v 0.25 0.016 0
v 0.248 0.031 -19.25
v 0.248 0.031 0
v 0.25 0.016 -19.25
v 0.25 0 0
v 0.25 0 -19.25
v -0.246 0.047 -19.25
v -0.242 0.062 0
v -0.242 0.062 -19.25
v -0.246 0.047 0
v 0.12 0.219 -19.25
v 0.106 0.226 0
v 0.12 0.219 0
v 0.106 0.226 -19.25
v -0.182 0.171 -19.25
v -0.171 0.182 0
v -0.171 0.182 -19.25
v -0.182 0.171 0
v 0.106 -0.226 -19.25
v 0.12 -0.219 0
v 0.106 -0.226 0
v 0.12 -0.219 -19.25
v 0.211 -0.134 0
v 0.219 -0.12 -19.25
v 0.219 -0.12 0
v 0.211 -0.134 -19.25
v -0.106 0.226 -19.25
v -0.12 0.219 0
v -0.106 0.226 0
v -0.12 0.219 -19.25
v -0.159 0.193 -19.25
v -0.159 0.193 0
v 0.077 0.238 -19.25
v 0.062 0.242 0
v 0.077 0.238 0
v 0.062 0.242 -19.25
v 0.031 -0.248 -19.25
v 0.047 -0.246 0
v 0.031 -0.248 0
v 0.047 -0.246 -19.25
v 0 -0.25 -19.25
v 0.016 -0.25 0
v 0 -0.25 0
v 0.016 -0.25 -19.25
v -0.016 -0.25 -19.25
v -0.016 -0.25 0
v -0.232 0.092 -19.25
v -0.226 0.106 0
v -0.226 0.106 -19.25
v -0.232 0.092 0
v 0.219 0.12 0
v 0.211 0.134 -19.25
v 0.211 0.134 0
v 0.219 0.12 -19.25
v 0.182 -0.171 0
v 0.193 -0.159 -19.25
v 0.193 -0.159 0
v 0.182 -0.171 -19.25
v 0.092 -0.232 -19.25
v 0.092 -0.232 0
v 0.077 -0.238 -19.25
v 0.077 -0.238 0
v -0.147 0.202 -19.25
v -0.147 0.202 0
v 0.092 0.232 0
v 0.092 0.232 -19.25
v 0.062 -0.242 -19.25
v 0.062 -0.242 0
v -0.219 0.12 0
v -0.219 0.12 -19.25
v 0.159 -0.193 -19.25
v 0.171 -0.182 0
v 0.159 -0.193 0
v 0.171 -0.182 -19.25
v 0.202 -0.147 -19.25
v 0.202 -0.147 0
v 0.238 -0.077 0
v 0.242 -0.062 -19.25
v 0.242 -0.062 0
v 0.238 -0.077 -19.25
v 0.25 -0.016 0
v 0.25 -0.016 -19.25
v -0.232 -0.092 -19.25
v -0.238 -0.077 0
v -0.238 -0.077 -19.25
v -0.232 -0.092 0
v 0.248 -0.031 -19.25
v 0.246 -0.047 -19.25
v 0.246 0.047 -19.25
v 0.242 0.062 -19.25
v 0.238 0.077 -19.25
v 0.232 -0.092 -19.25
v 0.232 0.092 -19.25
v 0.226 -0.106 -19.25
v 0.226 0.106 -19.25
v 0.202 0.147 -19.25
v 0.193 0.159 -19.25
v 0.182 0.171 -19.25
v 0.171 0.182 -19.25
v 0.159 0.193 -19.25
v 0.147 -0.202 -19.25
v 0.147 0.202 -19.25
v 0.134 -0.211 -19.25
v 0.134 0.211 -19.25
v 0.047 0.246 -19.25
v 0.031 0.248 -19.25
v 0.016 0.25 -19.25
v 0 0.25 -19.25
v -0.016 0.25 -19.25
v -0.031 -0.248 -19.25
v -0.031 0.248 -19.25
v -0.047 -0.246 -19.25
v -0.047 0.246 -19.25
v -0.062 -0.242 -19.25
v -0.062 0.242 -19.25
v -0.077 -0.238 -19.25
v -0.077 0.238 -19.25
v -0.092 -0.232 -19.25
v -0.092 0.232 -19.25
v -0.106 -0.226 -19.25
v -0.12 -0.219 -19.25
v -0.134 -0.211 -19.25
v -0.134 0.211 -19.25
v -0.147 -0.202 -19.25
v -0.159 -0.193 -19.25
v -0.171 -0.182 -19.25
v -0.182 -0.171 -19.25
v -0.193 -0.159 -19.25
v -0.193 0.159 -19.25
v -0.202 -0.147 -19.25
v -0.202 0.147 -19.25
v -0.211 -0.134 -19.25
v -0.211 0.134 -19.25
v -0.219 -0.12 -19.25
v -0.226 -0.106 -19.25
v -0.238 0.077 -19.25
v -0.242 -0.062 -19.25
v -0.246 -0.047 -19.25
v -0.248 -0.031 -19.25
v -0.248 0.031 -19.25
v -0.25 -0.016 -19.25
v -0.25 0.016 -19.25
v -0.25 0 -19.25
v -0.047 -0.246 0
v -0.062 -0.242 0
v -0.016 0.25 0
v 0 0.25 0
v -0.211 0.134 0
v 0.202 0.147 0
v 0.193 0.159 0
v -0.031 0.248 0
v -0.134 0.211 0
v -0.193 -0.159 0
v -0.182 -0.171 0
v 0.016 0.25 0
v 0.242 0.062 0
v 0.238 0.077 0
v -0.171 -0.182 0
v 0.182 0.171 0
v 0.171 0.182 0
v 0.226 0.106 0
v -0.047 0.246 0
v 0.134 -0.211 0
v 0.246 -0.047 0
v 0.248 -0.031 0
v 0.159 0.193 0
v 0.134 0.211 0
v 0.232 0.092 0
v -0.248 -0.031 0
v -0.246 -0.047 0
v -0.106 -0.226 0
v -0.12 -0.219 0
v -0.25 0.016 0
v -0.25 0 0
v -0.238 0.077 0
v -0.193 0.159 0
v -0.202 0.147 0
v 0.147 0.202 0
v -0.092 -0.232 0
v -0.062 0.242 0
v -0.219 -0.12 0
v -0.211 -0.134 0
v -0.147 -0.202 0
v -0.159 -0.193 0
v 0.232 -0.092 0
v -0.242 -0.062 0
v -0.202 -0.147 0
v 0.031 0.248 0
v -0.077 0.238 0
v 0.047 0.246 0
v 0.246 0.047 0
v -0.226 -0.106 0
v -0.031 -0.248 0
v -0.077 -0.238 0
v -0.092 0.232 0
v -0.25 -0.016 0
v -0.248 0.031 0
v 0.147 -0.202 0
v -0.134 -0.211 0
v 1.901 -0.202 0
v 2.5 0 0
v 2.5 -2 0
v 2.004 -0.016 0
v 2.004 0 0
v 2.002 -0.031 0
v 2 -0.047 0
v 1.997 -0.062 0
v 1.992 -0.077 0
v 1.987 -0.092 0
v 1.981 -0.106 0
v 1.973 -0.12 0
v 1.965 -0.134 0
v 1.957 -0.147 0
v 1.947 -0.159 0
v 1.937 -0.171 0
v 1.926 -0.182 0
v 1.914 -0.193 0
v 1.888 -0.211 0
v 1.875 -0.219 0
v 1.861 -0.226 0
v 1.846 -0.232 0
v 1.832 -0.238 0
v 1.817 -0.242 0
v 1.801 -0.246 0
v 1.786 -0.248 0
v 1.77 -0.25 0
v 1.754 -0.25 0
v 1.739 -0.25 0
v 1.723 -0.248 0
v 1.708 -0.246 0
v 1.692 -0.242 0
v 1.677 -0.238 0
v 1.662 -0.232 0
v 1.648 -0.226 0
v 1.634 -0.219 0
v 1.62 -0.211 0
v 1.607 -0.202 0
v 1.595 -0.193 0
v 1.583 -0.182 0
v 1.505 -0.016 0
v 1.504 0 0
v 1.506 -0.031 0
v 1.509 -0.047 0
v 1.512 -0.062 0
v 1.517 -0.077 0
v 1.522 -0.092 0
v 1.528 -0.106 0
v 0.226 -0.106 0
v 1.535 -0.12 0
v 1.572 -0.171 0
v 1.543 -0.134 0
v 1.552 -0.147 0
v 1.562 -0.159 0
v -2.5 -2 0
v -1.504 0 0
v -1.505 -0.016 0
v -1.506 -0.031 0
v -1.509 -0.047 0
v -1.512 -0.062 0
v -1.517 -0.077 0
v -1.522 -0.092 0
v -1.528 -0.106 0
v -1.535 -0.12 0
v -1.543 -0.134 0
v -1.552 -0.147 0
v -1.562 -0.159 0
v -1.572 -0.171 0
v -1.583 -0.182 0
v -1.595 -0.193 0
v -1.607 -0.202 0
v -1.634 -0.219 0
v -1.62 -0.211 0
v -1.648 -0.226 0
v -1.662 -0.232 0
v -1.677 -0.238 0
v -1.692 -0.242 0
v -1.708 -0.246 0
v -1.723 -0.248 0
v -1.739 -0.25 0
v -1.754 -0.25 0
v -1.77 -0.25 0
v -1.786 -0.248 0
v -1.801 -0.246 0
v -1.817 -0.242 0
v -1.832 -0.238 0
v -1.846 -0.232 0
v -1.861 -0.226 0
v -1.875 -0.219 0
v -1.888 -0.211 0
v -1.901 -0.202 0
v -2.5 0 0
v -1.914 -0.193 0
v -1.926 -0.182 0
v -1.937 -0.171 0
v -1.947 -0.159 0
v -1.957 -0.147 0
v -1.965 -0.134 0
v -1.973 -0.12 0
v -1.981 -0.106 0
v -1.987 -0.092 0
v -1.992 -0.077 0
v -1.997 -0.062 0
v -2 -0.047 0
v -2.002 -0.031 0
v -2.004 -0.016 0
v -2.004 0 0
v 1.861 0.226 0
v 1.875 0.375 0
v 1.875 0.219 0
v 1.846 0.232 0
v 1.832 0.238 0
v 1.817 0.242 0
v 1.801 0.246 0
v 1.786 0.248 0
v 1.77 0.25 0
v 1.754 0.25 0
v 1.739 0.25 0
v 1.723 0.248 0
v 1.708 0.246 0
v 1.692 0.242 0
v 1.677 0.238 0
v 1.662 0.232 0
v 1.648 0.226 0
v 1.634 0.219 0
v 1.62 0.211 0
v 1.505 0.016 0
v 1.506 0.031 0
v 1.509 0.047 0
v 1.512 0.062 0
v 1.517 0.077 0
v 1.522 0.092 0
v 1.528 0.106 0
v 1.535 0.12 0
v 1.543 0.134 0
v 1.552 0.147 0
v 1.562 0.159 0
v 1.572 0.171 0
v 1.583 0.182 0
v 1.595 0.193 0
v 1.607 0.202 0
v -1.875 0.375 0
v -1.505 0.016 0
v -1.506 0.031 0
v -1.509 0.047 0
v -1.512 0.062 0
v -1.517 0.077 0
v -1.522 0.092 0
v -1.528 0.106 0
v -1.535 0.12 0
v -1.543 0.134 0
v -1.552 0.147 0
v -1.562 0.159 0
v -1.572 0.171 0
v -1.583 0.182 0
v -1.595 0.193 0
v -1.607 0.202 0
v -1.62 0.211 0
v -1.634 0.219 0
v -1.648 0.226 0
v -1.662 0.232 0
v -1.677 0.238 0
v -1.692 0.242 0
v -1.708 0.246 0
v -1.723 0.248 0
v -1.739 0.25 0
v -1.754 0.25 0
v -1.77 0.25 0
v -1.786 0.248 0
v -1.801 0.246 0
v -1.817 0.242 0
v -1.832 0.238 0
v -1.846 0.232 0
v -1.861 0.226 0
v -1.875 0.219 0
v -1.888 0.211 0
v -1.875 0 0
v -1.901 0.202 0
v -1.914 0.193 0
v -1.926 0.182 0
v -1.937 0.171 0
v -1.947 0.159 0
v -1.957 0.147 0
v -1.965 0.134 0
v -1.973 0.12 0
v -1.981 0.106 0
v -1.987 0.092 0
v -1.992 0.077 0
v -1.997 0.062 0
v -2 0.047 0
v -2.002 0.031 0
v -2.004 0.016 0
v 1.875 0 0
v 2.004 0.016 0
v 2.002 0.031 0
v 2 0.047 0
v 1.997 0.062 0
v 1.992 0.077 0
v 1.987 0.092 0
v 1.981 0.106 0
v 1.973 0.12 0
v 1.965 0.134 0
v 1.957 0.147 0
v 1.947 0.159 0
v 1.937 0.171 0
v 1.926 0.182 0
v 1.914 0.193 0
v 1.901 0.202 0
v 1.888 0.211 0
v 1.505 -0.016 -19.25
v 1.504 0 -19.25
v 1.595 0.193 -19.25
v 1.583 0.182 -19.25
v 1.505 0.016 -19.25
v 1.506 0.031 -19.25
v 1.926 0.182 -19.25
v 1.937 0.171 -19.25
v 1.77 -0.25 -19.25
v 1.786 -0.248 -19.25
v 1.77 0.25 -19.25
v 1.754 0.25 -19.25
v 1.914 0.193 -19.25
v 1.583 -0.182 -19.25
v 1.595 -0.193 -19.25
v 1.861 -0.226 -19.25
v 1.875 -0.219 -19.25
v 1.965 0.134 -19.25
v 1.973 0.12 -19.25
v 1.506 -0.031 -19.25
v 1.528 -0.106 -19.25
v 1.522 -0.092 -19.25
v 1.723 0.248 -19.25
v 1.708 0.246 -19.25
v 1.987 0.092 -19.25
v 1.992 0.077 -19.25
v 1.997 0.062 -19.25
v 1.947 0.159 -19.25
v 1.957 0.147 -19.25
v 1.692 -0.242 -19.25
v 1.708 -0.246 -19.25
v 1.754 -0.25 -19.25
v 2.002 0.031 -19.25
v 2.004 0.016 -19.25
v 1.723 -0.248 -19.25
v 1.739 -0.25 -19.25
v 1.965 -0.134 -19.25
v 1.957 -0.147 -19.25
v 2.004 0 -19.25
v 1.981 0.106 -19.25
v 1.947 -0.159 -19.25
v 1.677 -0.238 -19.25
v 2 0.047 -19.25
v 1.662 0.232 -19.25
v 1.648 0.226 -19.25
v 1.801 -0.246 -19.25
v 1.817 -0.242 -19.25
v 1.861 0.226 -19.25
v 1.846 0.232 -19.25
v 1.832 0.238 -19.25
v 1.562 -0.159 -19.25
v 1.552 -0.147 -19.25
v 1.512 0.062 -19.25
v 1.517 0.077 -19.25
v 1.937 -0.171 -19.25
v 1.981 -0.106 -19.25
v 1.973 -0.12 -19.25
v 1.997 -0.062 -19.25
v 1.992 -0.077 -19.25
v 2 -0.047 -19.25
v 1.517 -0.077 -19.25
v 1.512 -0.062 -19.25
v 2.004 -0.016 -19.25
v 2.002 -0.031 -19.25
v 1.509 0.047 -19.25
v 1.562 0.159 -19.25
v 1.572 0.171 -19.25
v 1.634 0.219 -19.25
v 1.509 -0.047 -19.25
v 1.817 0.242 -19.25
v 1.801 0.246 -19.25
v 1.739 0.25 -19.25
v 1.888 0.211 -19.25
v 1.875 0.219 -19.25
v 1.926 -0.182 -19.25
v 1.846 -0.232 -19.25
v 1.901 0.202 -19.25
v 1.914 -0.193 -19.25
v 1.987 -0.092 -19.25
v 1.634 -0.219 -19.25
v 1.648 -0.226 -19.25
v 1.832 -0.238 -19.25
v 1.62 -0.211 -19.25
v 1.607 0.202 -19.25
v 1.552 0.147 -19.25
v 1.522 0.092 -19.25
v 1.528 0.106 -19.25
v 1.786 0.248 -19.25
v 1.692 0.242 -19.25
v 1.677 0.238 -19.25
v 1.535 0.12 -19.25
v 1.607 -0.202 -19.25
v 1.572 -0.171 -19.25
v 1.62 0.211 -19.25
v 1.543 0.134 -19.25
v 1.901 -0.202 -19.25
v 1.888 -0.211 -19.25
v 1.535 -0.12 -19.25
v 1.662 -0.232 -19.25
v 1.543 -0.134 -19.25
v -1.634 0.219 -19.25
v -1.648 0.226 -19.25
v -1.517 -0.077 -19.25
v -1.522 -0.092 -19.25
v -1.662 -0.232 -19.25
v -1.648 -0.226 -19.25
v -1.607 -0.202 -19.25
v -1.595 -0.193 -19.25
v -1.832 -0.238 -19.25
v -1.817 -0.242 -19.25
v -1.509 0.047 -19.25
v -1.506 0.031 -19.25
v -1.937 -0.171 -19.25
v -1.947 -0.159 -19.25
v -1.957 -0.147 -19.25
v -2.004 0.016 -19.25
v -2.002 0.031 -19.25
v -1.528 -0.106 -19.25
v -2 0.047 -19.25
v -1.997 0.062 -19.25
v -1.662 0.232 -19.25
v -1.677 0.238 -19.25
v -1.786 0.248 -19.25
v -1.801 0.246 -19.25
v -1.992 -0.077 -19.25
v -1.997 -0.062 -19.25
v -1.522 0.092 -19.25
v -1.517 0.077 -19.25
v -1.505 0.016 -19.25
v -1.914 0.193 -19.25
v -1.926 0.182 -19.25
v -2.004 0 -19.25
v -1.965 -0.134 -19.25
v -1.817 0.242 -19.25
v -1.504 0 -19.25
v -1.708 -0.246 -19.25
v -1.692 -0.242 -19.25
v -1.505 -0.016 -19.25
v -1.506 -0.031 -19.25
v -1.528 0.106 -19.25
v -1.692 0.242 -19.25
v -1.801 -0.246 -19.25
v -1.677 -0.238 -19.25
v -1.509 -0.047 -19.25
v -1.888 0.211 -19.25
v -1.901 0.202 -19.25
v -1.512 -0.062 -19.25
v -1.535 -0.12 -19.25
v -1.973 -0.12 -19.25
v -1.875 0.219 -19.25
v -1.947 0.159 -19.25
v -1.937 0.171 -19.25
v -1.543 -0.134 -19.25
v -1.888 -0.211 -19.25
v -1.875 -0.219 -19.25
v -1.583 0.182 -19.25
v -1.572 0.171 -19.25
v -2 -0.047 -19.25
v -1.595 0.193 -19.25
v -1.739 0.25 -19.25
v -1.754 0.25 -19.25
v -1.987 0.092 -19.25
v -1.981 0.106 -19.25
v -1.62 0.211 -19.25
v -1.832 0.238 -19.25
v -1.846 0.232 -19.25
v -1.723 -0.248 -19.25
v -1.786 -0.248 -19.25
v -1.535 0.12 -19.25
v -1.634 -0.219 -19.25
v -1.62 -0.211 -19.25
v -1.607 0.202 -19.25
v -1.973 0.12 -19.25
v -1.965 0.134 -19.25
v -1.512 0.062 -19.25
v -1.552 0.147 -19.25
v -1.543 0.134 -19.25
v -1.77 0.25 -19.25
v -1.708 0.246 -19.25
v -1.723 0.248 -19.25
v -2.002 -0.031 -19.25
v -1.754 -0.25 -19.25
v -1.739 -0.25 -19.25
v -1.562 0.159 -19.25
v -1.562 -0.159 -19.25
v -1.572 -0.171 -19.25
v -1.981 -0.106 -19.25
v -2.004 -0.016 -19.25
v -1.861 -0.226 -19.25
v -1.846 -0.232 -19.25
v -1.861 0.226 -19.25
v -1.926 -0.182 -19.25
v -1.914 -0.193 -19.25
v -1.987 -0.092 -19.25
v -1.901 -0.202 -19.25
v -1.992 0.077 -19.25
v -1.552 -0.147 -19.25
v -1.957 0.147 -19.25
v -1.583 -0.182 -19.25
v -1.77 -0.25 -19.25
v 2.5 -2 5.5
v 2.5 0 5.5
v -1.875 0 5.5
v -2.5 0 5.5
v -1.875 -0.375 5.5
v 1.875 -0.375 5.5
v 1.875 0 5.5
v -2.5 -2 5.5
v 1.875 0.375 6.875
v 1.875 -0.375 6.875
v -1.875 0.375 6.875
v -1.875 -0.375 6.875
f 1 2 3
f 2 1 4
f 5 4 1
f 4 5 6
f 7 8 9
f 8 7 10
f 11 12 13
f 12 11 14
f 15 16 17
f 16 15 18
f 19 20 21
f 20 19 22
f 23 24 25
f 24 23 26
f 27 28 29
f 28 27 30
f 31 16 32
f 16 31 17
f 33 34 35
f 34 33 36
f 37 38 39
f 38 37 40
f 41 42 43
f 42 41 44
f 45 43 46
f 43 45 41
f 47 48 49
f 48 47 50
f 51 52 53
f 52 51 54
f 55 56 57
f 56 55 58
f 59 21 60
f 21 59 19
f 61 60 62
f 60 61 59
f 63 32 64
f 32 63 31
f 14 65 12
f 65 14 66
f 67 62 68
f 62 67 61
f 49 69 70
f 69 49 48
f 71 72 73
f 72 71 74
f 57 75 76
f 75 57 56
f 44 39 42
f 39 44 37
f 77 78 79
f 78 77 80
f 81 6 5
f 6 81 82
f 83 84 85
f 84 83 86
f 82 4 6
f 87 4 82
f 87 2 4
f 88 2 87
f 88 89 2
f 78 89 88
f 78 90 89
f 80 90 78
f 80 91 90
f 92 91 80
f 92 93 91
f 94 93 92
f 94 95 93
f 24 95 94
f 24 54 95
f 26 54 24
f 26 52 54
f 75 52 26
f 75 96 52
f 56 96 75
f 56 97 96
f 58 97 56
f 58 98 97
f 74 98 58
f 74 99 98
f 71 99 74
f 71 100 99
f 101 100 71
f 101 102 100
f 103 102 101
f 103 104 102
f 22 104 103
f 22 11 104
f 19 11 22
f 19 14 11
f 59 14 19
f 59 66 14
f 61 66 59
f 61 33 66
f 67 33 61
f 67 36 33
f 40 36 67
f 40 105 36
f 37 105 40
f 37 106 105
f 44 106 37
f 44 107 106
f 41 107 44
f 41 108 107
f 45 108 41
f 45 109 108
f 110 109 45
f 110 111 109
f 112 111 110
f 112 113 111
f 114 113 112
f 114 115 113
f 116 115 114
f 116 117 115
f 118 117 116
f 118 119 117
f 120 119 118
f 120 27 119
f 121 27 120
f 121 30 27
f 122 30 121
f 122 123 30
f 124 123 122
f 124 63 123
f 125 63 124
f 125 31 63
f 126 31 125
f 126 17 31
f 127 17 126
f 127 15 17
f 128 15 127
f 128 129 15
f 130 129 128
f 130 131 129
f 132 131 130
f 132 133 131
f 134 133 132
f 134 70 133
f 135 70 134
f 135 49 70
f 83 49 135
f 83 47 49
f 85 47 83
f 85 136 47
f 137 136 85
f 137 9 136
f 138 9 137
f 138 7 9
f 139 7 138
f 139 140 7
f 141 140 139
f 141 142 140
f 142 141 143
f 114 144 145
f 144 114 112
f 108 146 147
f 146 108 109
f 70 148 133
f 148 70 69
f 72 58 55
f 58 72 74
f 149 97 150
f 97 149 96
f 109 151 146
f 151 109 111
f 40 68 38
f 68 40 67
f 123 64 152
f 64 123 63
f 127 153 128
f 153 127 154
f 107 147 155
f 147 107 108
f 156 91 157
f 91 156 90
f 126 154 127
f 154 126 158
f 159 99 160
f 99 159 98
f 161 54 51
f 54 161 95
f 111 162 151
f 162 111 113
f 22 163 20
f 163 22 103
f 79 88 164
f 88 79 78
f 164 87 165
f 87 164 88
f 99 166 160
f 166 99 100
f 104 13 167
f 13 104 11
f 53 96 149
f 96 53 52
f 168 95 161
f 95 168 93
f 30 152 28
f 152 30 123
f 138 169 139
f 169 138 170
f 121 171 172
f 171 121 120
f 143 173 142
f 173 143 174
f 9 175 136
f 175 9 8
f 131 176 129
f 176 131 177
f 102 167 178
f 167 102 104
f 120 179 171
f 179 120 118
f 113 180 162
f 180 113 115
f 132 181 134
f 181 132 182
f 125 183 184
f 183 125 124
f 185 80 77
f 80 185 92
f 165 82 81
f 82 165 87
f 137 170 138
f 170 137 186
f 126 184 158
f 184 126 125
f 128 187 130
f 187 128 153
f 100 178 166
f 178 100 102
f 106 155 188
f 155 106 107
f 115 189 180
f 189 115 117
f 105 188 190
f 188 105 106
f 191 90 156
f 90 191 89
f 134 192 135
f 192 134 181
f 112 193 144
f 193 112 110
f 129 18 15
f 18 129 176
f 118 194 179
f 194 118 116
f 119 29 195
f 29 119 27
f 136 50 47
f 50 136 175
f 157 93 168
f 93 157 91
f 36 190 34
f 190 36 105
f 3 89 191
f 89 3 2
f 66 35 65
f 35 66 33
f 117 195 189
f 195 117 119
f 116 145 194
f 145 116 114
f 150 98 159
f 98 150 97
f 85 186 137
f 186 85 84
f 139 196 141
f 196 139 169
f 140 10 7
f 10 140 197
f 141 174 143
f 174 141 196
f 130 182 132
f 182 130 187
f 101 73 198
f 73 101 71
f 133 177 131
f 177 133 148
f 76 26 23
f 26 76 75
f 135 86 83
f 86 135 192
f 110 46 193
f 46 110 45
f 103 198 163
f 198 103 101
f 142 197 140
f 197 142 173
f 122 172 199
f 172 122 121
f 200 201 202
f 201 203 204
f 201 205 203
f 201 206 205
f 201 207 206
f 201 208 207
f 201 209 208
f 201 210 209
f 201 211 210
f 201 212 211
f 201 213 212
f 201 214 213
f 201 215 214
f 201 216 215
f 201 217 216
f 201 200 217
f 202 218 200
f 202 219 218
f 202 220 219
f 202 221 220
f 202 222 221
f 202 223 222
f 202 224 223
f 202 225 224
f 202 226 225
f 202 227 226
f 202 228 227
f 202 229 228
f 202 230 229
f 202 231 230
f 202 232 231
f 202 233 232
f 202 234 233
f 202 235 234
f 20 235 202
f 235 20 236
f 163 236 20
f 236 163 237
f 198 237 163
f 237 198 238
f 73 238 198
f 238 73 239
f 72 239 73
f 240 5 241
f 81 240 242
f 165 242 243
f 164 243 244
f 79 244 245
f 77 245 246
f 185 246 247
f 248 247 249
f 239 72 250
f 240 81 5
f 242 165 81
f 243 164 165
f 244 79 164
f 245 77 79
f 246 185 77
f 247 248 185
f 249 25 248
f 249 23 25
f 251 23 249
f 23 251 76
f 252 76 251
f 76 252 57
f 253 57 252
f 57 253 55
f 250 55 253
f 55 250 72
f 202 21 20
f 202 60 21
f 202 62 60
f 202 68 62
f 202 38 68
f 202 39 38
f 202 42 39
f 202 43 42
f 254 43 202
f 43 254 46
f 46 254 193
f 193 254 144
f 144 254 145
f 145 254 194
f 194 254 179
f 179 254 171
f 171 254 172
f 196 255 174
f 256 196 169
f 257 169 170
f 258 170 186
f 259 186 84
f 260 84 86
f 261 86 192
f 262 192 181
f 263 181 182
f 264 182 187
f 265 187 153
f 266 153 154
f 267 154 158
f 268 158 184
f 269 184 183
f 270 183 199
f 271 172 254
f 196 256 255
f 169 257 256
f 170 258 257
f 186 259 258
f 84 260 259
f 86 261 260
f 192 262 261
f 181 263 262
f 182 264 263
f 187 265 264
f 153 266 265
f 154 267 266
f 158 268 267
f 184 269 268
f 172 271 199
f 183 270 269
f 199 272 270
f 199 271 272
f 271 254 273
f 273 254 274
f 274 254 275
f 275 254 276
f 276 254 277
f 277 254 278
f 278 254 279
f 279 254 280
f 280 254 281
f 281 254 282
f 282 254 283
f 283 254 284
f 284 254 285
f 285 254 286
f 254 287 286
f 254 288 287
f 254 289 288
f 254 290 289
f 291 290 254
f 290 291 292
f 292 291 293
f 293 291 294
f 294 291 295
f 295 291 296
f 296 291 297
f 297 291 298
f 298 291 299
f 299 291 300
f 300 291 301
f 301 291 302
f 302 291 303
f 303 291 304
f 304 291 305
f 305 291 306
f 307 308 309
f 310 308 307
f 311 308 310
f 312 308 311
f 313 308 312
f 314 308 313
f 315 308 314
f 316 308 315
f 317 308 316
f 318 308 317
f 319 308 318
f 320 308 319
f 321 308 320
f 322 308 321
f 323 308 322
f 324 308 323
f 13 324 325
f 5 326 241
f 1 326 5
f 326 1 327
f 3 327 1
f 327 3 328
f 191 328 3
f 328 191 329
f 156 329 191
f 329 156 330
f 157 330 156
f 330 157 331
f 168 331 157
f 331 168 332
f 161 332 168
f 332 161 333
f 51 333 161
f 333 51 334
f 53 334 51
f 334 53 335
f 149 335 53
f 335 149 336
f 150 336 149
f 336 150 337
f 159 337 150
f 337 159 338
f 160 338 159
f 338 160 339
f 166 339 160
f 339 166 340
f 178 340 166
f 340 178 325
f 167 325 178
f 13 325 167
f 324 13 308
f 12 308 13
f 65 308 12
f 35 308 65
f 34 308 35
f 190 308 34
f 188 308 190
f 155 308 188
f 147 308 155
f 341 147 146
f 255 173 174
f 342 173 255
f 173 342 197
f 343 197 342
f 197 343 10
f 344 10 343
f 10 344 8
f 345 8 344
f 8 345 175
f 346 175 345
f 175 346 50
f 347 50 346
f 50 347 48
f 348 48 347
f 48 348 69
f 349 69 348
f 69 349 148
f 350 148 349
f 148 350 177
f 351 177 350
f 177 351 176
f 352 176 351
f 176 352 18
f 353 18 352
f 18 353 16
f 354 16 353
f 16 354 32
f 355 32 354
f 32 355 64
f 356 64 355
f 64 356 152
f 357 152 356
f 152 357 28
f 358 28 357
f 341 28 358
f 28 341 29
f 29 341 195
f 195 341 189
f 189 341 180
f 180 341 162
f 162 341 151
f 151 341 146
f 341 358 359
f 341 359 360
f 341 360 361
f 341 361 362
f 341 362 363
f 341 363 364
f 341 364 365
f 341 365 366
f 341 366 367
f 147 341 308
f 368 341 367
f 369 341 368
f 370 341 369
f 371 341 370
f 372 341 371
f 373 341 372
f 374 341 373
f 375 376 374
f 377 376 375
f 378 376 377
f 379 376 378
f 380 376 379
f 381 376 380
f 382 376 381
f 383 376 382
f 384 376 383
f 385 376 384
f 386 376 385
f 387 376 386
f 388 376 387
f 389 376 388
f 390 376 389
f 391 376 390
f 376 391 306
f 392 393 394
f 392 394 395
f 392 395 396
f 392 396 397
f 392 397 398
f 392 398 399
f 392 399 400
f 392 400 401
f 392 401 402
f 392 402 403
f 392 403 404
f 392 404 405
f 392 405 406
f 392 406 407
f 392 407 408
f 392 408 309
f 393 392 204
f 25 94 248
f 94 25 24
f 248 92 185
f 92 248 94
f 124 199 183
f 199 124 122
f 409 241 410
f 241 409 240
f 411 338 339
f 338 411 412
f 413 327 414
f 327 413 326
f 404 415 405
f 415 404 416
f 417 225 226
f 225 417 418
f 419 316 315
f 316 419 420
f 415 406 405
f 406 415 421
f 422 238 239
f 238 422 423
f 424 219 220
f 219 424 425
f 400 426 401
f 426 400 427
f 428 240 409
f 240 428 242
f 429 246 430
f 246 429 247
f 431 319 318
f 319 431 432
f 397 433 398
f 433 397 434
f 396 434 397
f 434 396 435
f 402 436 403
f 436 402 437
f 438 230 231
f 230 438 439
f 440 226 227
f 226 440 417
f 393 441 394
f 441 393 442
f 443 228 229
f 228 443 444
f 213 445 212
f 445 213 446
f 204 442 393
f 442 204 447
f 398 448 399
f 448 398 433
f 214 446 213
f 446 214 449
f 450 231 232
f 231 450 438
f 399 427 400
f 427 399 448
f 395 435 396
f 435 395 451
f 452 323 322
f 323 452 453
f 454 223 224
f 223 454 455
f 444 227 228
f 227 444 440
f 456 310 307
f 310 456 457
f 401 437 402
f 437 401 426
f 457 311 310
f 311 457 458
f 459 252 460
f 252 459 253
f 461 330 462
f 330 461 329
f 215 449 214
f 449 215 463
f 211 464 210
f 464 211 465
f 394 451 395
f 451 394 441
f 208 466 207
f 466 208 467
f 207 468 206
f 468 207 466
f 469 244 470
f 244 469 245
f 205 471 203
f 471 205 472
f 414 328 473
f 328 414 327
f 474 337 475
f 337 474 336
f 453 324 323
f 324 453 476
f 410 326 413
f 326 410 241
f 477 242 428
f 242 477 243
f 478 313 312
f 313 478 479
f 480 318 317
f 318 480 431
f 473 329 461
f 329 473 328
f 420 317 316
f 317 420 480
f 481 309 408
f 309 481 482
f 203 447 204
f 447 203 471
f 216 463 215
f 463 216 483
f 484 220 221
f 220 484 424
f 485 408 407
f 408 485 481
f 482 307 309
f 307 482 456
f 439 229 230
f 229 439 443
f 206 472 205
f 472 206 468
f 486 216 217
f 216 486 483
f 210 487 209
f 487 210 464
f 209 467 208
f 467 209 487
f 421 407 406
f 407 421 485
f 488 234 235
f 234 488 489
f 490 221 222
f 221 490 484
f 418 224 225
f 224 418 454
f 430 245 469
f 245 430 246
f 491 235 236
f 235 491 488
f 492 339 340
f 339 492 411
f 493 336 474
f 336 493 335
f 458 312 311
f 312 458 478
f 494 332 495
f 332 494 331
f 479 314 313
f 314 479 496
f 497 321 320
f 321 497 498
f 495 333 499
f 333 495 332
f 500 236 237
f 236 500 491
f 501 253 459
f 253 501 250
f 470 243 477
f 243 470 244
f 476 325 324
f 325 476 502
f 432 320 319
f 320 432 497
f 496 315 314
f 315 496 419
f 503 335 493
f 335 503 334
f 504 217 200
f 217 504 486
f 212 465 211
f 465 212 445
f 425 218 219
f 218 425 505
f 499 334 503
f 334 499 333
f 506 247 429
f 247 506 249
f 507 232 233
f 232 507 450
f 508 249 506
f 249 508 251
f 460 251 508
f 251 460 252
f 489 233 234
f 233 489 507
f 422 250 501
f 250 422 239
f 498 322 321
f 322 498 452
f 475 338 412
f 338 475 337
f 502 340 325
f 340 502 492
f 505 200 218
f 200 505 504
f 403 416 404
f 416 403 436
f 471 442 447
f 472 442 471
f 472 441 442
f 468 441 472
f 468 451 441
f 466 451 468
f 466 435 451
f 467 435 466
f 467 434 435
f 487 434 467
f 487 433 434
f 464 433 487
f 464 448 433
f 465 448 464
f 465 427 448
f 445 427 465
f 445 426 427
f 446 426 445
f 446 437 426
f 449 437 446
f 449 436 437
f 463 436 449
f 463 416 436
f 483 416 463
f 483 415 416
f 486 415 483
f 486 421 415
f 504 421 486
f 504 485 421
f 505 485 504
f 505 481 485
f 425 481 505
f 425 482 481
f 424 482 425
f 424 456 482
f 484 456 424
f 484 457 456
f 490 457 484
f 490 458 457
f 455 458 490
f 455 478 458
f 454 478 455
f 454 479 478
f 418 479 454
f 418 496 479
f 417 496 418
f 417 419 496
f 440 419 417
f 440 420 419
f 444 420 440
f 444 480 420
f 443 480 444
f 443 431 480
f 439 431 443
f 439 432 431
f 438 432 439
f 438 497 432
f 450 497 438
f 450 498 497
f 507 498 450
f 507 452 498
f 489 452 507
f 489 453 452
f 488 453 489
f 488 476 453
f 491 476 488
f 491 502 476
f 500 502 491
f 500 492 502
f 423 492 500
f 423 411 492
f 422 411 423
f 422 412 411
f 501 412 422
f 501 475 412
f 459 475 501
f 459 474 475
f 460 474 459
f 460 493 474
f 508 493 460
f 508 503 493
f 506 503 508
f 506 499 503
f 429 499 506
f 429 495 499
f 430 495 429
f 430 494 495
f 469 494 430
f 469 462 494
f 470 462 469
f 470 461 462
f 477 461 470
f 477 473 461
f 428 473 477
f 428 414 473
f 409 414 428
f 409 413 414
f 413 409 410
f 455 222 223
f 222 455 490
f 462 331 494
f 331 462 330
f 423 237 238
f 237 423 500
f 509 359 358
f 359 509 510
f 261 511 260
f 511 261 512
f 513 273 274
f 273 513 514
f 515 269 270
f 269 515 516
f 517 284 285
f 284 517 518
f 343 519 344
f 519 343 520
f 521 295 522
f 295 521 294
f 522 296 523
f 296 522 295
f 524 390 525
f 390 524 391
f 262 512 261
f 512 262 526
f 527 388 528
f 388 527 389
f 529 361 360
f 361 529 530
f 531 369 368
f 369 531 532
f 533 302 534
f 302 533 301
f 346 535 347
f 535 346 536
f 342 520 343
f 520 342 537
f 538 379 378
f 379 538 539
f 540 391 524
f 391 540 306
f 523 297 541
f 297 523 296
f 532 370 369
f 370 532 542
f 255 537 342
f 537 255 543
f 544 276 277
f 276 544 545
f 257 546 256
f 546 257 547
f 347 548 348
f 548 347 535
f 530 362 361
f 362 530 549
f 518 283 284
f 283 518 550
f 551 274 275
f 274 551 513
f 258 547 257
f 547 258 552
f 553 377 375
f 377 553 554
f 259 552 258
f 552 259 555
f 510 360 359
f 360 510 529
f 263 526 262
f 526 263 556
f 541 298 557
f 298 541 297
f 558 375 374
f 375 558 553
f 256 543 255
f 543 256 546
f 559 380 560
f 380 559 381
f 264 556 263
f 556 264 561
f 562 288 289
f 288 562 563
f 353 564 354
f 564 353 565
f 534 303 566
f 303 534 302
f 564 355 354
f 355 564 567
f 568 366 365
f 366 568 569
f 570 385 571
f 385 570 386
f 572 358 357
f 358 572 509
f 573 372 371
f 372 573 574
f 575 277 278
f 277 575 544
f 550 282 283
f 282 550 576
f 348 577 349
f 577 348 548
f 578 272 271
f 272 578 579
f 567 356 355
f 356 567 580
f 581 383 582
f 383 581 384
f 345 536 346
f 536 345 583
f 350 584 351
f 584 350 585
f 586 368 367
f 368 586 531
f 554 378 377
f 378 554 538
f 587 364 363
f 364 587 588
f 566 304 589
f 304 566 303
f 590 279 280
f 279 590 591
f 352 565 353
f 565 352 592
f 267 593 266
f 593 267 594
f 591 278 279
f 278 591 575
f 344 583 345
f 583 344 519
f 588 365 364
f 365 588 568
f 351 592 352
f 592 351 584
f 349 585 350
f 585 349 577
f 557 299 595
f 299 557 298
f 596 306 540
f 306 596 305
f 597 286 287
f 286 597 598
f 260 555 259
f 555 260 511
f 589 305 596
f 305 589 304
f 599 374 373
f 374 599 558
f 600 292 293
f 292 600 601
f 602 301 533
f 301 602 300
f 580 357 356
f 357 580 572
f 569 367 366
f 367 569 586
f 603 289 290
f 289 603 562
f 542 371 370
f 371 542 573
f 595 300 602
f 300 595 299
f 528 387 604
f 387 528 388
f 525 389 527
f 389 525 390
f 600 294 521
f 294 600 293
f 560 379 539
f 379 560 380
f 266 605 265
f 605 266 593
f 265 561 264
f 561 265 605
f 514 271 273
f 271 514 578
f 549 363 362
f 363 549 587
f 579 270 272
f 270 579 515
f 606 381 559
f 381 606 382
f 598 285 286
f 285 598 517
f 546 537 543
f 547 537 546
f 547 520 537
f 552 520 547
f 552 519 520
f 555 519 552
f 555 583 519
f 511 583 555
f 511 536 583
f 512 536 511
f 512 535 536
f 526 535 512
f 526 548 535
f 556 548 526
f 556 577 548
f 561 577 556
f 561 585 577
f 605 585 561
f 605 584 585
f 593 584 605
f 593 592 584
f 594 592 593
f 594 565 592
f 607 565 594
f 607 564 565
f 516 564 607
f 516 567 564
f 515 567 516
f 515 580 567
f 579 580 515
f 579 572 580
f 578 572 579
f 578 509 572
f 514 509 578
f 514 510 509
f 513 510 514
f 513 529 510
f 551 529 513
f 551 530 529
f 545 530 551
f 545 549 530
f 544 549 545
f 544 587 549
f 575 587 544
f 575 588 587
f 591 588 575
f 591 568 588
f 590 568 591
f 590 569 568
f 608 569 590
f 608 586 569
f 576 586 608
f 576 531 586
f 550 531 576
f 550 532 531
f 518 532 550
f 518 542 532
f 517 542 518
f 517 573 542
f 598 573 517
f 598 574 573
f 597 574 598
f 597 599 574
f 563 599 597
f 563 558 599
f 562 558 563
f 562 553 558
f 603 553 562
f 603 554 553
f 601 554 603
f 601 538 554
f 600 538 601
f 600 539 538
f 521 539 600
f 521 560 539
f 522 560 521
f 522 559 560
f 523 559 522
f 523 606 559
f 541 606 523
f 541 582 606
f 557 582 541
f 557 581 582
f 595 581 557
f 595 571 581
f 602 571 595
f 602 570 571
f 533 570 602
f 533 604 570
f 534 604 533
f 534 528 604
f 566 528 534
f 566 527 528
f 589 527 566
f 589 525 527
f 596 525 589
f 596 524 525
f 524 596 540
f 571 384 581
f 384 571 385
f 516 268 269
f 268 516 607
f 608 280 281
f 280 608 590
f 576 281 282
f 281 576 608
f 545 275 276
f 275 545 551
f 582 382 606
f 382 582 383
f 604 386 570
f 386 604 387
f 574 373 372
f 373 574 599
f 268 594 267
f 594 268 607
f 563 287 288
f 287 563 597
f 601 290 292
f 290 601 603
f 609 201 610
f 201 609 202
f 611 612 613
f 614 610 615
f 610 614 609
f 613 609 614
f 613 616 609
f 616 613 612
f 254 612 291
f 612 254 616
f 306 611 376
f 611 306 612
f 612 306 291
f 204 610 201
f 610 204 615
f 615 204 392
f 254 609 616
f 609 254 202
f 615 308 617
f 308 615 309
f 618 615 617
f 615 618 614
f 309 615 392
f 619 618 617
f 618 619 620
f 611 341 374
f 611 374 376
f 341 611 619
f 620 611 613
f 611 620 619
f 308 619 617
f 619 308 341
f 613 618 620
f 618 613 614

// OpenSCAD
// Units in mm.

width=5;
depth=0.4*width;
height=1.1*width;
halfwd=width/2;

widthp=0.75*width;
depthp=0.2*widthp;
heightp=1.25*height;

pindiameter=0.25;
pinheight=3.5*height;
pinoffsetx = width/2.85;
ff=0.1;    // fudge factor

// This will have a corner at the origin
color([0.45,0.45,0.45]) {
  translate([-halfwd, -depth, 0]) cube([width, depth, height]);
}

color([0.95,0.95,0.95]) {
  translate([-widthp/2, -depthp/2, 0]) cube([widthp, depthp, heightp]);
}

color([0.95,0.95,0.95]) {
  translate([0,0,-pinheight]) cylinder(r=pindiameter, h=pinheight, $fn=100);
  translate([pinoffsetx,0,-pinheight]) cylinder(r=pindiameter, h=pinheight, $fn=100);
 translate([-pinoffsetx,0,-pinheight]) cylinder(r=pindiameter, h=pinheight, $fn=100);   
}
